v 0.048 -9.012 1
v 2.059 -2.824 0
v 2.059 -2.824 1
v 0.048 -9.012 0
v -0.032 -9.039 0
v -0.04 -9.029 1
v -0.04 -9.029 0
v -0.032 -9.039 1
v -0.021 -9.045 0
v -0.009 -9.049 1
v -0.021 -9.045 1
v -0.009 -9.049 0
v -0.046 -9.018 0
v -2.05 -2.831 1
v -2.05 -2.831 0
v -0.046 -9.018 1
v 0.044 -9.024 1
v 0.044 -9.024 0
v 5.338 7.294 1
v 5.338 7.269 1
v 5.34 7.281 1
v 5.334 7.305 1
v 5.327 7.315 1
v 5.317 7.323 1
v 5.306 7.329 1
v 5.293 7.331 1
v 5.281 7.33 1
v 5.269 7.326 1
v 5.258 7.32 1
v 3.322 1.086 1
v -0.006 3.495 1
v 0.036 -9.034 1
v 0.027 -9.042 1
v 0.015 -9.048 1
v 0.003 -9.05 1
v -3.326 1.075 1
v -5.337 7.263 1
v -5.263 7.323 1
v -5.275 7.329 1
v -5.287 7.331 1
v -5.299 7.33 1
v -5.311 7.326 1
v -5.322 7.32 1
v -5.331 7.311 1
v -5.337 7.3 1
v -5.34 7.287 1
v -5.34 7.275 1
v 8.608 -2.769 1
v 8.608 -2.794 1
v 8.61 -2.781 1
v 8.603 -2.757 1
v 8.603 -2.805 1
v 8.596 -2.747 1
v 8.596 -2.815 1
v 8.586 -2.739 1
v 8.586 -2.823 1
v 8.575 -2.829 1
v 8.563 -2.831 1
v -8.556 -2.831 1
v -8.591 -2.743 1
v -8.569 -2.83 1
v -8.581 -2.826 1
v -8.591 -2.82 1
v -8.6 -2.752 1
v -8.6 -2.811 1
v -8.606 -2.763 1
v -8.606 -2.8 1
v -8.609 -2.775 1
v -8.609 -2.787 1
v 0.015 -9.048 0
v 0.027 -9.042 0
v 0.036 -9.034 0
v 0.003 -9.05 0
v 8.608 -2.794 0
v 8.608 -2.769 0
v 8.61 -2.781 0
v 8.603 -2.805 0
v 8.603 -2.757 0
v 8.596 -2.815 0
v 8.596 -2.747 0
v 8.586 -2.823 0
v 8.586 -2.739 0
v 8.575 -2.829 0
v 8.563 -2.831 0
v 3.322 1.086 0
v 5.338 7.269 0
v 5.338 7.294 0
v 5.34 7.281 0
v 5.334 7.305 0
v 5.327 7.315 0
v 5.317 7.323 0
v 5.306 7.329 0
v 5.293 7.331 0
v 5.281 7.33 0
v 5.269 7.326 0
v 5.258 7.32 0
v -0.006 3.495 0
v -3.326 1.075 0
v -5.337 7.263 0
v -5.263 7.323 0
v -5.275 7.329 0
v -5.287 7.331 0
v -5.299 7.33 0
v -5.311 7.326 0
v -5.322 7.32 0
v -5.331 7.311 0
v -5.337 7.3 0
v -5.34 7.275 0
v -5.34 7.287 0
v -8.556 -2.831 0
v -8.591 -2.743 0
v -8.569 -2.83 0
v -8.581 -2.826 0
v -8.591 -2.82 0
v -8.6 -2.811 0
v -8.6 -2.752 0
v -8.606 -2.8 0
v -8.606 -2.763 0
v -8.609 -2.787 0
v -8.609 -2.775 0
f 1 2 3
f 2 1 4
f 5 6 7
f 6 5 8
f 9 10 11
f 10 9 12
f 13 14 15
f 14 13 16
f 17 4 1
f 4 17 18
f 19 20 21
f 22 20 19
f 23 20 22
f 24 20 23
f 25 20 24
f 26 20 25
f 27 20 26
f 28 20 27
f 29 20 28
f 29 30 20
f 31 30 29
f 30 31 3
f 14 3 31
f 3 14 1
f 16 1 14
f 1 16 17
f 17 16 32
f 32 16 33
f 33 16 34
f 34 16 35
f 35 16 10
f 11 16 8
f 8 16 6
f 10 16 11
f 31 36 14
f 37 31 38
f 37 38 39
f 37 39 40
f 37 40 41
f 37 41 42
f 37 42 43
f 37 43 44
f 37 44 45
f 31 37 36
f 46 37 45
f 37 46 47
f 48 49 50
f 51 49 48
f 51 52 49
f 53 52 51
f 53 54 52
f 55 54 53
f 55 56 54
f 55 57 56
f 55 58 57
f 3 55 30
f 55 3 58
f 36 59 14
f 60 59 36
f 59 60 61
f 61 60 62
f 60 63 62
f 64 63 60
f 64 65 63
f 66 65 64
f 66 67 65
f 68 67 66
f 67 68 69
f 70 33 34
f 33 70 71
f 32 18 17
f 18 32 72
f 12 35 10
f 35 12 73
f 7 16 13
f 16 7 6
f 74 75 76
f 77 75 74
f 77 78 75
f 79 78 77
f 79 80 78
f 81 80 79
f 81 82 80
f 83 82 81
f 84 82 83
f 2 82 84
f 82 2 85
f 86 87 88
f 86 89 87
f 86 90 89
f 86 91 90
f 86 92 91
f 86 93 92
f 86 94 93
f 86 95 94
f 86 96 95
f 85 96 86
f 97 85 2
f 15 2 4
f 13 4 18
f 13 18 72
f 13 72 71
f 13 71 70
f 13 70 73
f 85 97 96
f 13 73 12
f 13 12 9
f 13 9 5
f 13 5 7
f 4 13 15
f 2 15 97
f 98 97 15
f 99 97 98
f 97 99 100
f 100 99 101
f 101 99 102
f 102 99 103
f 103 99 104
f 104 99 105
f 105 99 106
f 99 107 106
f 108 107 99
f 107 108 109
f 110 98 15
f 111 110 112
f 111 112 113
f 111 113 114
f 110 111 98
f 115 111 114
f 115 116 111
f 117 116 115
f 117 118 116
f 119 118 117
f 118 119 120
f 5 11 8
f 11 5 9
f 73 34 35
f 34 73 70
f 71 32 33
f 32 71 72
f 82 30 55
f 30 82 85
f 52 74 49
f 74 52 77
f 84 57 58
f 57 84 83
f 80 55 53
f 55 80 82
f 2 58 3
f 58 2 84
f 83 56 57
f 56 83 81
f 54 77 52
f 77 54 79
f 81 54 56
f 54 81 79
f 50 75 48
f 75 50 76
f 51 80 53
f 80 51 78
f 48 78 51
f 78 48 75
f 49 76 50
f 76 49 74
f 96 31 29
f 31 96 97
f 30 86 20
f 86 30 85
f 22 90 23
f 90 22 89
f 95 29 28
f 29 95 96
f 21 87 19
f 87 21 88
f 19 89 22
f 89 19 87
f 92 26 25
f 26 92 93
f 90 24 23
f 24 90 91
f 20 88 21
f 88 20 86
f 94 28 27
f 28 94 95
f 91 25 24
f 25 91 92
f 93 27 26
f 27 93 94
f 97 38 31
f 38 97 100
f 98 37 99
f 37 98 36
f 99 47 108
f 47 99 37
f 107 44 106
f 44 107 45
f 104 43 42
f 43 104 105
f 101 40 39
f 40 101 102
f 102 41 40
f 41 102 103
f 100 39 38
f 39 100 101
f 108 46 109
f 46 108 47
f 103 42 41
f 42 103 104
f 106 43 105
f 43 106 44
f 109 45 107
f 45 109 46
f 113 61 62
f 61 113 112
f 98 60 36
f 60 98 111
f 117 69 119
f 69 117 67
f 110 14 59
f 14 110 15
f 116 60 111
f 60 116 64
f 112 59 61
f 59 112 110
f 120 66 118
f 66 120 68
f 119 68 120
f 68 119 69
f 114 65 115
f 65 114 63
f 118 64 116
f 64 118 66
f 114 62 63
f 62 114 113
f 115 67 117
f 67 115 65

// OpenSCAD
/** star_3d.scad  
 *  
 *  Author:             Mike Beyerle (mbeyerle116)
 *  Downloaded from:    https://www.thingiverse.com/thing:1118817/
 */


// number of points on the star (3 or more makes sense)
_points = 7;
// length of ech point from center.  1/2 the rounding value will be added to the length
_point_len = 25;
// used to adjust width of each point +/-
_adjust = 0;
// point height at end of points (thinkness of objet at thinest part. Should be less than cent_h
_pnt_h = 1;
// height at center of star. set equal to pnt_h for flat object
_cent_h = 3;
// diameter of rounding at end of point (must be greater than 0).
_rnd=1;

// resolution for rounded point
_fn = 25;


// modules in library:
module star_3d(points, point_len, adjust=0, pnt_h =1, cent_h=1, rnd=0.1, fn=25)
{
    // star_3d: star with raised center.
    //----------------------------------------------//
    // points = num points on star (should be >3.  
    //          Using 3 may require addisional 
    //          adjust be applied.)
    // point_len = len of point on star 
    //              (actual len of point will add 
    //              1/2 rnd to the length.)
    // adjust = +/- adjust of width of point
    // pnt_h = height of star at end of point
    // cent_h = height of star in center needs to be > pnt_h to have effect.
    // rnd = roundness of end of point (diameter)
    // fn = $fn value for rounded point
    //----------------------------------------------//
    
    point_deg= 360/points;
    point_deg_adjusted = point_deg + (-point_deg/2) +  adjust;
    
    if(points == 3 && adjust == 0)
    {  // make a pyramid (this is to avoid rendering 
       //            issues in this special case)
        hull()
        {
           for(i=[0:2])
           {
               rotate([0,0,i*point_deg])
               translate([point_len,0,0])
                    cylinder(pnt_h, d=rnd, $fn=fn);
           }
           cylinder(cent_h, d=.001);
        }
    }
    else
    { // use algorithm
        for(i=[0:points-1])
        {
            rotate([0,0,i * point_deg]) 
                translate([0,-point_len,0]) 
                point(point_deg_adjusted, 
                      point_len, 
                      rnd, 
                      pnt_h, 
                      cent_h, 
                      fn);
        }
    }

}

module point(deg, leng, rnd, h1, h2, fn=25)
{   // create a point of the star.
    hull()
    {
        cylinder(h1, d=rnd, $fn=fn);
        translate([0,leng,0]) cylinder(h2, d=.001);
        rotate([0,0,-deg/2]) 
            translate([0,leng,0]) cylinder(h1, d=rnd);
        rotate([0,0,deg/2]) 
            translate([0,leng,0]) cylinder(h1, d=rnd);
    }
}


// test object:
star_3d(
    points      = 5,
    point_len   = 0.9*10,
    adjust      = 0
//        pnt_h = _pnt_h, 
//        cent_h =_cent_h, 
//        rnd = _rnd,
//        fn = _fn
);
